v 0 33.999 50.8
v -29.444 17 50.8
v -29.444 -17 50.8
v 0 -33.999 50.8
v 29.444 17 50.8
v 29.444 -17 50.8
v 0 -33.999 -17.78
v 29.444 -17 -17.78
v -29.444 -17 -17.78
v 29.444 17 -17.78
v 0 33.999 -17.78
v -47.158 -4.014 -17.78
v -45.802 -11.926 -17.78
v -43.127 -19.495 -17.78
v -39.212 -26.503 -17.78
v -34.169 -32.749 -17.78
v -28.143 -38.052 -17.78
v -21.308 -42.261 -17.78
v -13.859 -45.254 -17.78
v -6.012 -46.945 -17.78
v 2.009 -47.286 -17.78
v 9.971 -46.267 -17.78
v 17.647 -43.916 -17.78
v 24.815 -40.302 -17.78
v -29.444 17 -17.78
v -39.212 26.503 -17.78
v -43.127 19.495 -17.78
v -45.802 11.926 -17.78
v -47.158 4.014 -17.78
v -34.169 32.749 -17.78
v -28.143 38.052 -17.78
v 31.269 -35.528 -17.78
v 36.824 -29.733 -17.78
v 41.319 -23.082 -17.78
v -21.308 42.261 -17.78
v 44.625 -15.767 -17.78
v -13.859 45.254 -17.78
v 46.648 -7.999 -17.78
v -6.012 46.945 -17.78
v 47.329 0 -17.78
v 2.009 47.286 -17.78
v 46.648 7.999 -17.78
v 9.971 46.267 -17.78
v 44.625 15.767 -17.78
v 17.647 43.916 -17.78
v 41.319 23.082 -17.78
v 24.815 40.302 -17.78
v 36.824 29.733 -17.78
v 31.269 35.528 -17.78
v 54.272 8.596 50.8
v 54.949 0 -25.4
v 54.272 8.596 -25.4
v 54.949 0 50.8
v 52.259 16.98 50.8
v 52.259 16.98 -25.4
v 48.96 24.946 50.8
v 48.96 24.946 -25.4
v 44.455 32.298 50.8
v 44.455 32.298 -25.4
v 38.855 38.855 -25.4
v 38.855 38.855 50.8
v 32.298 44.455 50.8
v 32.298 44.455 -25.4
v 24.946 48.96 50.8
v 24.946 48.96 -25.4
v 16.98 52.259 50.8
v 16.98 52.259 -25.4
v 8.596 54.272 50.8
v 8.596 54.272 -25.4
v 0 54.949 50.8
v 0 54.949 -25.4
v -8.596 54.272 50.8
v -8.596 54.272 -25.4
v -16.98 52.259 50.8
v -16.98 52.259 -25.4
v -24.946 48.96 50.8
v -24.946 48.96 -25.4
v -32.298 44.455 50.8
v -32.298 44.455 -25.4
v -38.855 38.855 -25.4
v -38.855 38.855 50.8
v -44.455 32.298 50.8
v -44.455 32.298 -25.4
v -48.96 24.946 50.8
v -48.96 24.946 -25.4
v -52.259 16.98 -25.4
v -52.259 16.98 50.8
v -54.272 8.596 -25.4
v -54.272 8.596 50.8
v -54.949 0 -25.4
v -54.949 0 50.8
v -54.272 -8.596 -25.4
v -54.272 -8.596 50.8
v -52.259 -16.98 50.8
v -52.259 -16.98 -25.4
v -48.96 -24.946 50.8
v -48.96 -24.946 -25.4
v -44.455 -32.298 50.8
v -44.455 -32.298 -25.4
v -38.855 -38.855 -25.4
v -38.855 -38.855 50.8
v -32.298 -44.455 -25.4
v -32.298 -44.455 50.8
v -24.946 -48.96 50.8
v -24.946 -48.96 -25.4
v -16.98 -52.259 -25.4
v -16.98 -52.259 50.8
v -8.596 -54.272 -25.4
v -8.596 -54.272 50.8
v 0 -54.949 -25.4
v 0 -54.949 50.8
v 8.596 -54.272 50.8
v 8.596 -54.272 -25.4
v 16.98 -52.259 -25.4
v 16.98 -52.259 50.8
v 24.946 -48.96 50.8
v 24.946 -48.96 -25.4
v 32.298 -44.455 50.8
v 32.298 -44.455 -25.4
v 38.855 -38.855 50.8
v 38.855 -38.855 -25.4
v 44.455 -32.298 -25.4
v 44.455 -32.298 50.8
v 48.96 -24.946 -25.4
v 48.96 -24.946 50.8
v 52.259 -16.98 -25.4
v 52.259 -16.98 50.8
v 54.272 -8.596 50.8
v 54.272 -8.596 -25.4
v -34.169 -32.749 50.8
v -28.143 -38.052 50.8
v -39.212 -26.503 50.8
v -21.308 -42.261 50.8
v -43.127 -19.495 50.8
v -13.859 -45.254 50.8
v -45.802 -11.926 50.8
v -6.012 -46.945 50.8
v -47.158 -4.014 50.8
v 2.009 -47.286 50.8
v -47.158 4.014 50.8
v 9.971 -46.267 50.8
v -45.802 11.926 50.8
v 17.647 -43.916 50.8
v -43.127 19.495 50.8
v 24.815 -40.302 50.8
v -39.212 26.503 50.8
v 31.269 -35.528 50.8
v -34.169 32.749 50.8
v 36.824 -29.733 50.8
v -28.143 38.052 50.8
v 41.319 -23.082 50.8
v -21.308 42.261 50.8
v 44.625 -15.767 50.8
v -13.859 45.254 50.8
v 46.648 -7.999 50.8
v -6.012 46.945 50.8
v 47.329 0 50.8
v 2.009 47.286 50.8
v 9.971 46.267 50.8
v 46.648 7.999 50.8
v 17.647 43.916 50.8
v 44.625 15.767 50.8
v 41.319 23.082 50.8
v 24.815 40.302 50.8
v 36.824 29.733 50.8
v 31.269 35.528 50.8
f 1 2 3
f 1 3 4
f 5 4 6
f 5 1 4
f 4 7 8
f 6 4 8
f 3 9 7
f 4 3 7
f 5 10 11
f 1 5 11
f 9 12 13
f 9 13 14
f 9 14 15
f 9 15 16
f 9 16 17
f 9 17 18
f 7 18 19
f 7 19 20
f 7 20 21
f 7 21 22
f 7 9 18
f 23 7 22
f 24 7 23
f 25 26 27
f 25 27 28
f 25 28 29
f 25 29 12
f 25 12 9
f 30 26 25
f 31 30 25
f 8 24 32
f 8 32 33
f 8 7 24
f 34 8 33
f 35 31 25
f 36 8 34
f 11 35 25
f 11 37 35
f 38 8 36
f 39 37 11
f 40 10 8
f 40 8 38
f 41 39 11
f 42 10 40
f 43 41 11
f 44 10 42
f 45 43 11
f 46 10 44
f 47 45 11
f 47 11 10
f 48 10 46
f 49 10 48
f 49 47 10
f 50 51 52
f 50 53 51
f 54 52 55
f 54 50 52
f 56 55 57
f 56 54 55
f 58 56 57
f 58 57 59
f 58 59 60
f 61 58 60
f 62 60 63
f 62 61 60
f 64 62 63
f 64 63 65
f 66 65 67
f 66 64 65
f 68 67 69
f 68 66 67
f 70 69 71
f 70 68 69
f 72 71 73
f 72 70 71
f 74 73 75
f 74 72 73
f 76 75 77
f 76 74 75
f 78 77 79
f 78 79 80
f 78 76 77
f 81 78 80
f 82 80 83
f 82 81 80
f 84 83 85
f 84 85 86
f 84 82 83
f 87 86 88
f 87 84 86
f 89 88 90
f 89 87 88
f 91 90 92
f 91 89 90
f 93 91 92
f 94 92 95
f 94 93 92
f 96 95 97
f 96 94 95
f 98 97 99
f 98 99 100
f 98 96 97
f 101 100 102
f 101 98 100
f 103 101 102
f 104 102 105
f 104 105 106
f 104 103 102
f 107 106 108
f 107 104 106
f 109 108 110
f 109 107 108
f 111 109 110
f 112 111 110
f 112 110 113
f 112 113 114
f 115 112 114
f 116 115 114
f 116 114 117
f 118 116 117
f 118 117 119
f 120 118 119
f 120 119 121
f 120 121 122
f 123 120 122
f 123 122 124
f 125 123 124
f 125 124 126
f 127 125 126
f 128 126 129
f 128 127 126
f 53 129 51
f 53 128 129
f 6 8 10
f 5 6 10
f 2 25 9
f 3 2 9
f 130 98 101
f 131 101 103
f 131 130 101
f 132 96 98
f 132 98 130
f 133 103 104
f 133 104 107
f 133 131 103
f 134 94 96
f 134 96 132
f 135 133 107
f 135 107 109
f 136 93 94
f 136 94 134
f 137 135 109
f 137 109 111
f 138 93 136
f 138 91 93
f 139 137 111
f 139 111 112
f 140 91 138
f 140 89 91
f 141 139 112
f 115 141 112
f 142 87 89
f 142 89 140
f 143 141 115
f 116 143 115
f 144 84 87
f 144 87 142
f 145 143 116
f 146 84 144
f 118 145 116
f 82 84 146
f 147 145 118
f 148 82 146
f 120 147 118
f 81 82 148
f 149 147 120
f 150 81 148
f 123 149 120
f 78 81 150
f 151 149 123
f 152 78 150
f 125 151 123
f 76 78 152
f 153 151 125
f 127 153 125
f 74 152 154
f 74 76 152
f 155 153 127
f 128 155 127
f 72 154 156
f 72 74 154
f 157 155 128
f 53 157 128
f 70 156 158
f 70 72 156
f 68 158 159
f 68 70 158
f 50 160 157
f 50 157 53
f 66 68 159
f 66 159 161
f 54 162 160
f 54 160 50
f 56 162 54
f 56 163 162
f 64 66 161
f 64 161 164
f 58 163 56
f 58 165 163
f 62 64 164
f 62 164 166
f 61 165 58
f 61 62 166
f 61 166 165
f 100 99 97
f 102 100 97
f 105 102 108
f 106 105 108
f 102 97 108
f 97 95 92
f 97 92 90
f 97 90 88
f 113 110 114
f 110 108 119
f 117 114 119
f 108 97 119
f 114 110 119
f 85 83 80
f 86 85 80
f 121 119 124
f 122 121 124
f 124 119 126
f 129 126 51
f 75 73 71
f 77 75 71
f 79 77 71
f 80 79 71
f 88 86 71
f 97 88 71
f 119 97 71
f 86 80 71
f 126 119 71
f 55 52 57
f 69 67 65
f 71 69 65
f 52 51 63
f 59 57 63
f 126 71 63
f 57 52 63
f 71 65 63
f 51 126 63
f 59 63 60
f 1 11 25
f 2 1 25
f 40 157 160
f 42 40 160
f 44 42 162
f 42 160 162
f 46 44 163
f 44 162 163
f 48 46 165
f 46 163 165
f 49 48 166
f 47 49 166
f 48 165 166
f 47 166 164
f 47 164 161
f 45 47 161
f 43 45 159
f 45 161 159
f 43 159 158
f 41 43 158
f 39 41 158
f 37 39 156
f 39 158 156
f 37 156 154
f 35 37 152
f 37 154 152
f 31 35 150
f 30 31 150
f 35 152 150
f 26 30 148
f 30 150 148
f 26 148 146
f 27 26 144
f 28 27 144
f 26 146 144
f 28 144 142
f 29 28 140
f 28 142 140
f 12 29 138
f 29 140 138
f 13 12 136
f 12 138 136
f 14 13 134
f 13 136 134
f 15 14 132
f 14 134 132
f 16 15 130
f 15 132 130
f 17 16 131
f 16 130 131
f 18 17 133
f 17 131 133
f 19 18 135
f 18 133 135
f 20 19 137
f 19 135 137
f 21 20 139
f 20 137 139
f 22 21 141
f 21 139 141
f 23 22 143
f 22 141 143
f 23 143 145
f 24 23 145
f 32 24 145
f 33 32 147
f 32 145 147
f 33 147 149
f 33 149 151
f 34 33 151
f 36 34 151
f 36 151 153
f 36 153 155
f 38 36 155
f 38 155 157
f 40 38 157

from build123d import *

# Parameters (mm, degrees)
F0_R          = 54.948812
F1_DEPTH      = 50.8
F1_DEPTH_BACK = 25.4
F2_T          = -7.62
F4_DEPTH      = 68.58


with BuildPart() as f1:
    # F0 (on Top) → F1 (new body, two sides)
    with BuildSketch(Plane.XY) as f1_sk:
        Circle(F0_R)
    extrude(amount=F1_DEPTH)
    extrude(f1_sk.sketch, amount=-F1_DEPTH_BACK)

    # F2
    f2_openings = [f1.faces().sort_by_distance(p)[0] for p in [
        (0, 0, 50.8),
    ]]
    offset(amount=F2_T, openings=f2_openings)

    # F3 (on face) → F4 (join)
    with BuildSketch(Plane.XY.offset(-17.78)):
        Polygon((29.444208, -16.999622), (29.444208, 16.999622), (0, 33.999243), (-29.444208, 16.999622), (-29.444208, -16.999622), (0, -33.999243), align=None)
    extrude(amount=F4_DEPTH)


solid = f1.part
